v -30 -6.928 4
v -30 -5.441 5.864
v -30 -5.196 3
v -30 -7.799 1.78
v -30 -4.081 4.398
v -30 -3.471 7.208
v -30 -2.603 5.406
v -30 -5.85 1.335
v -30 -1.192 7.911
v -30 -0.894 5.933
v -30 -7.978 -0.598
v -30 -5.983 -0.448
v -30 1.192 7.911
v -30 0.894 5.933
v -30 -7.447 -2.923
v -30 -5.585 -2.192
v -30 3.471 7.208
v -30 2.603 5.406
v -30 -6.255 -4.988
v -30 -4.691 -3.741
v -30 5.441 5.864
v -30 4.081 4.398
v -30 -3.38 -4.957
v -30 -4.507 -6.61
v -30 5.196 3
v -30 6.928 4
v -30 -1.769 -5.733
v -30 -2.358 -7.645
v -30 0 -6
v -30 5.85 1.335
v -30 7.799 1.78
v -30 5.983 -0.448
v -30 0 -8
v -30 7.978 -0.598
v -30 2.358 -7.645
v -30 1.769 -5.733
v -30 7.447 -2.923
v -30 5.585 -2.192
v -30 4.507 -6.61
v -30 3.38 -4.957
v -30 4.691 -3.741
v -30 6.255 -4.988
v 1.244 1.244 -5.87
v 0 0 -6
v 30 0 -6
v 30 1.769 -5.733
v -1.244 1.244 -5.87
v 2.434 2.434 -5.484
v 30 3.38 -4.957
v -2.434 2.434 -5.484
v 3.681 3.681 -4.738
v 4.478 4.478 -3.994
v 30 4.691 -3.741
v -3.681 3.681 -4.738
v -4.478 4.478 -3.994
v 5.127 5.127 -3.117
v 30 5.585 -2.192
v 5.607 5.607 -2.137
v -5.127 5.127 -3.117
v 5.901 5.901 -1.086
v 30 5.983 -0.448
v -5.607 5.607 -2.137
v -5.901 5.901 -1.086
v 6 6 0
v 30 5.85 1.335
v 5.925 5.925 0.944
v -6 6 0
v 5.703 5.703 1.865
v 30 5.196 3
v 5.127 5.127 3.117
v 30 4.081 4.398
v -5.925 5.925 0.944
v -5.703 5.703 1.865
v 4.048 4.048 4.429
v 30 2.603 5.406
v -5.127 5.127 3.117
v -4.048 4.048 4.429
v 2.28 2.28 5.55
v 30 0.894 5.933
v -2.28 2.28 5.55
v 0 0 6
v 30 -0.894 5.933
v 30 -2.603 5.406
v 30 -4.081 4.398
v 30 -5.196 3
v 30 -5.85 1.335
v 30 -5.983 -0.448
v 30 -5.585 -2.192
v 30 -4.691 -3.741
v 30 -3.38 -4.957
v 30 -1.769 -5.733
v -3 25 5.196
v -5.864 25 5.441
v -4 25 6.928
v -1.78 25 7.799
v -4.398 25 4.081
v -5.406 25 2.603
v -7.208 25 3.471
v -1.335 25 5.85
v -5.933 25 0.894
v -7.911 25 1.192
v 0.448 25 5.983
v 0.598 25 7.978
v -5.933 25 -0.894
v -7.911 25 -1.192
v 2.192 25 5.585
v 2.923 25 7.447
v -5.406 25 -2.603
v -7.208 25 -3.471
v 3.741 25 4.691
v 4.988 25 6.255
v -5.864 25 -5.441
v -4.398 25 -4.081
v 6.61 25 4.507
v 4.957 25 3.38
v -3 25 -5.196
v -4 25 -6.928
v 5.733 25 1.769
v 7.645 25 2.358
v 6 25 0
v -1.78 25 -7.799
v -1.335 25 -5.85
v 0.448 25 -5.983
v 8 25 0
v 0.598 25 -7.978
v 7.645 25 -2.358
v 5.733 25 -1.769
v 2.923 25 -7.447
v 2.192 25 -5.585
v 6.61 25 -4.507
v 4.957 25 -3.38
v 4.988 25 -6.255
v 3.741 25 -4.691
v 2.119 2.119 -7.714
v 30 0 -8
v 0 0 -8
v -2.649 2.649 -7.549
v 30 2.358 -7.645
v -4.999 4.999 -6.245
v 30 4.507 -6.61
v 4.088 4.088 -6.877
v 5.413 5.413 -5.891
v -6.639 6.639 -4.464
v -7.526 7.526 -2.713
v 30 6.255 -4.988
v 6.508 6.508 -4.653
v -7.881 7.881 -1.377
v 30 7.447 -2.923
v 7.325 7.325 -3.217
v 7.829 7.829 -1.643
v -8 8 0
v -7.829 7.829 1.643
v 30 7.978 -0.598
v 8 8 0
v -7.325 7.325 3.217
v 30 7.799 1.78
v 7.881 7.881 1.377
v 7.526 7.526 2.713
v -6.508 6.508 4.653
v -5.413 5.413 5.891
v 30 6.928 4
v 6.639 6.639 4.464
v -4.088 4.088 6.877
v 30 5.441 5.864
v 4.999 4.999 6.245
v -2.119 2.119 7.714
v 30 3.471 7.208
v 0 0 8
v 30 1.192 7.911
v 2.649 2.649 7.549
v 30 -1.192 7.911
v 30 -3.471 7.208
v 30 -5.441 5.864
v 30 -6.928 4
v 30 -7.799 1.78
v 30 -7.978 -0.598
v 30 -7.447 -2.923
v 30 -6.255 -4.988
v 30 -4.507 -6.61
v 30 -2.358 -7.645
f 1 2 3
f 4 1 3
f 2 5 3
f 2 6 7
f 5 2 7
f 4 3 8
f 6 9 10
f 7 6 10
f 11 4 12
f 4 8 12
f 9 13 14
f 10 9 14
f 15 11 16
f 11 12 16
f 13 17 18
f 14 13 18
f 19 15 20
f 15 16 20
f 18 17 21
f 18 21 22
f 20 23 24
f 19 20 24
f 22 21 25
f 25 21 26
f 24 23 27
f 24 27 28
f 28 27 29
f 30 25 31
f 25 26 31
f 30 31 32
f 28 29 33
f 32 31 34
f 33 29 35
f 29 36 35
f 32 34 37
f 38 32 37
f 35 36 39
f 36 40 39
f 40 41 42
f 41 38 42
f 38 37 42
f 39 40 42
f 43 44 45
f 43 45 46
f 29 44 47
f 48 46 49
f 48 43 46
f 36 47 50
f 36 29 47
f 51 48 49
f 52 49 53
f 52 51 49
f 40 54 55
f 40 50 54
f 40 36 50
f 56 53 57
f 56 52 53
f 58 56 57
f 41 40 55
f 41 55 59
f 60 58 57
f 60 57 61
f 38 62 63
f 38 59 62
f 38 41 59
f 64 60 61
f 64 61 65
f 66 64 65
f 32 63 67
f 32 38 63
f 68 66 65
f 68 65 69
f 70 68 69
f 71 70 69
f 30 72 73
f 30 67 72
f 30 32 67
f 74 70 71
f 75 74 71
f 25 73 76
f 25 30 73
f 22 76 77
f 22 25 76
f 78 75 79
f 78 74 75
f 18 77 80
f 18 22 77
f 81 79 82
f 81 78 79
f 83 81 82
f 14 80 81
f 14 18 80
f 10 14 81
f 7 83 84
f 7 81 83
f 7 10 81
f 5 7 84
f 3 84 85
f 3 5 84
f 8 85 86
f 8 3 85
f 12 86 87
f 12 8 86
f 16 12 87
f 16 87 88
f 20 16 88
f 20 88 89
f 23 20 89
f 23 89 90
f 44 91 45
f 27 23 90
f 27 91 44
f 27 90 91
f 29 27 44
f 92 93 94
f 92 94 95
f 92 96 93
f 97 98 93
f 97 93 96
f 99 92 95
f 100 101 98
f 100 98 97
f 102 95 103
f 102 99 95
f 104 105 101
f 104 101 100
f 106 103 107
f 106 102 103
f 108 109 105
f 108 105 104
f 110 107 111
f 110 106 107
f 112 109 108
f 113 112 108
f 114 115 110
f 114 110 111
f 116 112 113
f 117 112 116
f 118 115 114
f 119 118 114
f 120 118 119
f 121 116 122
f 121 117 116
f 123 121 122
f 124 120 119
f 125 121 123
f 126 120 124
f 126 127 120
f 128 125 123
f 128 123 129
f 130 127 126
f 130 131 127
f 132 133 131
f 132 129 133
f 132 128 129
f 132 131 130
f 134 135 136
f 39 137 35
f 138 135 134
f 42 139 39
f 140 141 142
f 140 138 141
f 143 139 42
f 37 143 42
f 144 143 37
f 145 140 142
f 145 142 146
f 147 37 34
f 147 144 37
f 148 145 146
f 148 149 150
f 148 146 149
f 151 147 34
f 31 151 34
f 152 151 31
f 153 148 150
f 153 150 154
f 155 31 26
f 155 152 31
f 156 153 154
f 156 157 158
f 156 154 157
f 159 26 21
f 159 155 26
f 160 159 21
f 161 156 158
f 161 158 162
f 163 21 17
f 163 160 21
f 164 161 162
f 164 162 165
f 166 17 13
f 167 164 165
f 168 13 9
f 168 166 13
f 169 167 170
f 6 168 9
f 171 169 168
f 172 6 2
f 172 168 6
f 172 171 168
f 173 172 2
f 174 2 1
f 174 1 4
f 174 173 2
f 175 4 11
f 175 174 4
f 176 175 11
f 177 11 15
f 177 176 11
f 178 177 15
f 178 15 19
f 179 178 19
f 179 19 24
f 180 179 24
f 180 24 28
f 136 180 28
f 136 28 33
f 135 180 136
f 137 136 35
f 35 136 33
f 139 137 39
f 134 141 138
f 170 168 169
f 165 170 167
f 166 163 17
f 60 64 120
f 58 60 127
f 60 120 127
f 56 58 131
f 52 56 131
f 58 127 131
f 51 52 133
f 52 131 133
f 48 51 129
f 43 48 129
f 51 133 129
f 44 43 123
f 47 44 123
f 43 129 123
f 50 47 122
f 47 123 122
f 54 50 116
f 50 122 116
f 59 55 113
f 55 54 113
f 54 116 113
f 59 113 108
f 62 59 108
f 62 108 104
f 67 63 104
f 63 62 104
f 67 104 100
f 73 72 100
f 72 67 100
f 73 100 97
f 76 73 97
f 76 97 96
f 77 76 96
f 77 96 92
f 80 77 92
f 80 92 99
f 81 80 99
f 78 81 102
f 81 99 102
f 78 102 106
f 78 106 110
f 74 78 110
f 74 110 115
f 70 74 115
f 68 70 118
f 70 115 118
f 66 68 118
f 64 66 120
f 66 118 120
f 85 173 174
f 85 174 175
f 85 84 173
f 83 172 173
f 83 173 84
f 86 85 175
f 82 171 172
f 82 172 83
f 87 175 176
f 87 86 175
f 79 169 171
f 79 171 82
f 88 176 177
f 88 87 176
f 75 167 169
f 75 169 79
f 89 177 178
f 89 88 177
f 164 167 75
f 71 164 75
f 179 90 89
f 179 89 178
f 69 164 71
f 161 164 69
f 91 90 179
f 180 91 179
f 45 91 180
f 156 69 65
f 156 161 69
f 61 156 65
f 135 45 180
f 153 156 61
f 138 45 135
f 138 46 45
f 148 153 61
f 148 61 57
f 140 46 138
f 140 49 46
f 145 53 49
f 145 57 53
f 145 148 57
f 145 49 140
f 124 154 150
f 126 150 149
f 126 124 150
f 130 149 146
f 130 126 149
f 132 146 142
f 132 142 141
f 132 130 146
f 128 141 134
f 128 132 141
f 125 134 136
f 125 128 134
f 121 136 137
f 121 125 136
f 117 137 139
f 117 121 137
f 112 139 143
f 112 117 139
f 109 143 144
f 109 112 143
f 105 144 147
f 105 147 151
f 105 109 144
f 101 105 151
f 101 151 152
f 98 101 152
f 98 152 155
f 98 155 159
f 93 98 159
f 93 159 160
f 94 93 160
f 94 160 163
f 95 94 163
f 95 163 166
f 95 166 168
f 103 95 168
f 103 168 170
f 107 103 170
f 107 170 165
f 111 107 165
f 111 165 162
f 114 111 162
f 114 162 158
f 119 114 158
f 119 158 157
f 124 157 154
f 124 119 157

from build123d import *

# Parameters (mm, degrees)
SKETCH1_R           = 8
SKETCH1_R_2         = 6
BOSS_EXTRUDE1_DEPTH = 30
BOSS_EXTRUDE2_REACH = 35
SKETCH3_R           = 8
SKETCH4_R           = 6
CUT_EXTRUDE1_DEPTH  = 25


with BuildPart() as part:
    # Sketch1 → Boss-Extrude1 (new body, symmetric)
    with BuildSketch(Plane(origin=(0, 0, 0), x_dir=(0, 0, -1), z_dir=(1, 0, 0))):
        Circle(SKETCH1_R)
        Circle(SKETCH1_R_2, mode=Mode.SUBTRACT)
    extrude(amount=BOSS_EXTRUDE1_DEPTH, both=True)

    # Sketch3 → Boss-Extrude2 (add, up to next)
    with BuildSketch(Plane(origin=(0, 25, 0), x_dir=(1, 0, 0), z_dir=(0, 1, 0)), mode=Mode.PRIVATE) as boss_extrude2_sk1:
        Circle(SKETCH3_R)
    boss_extrude2_tool1 = extrude(boss_extrude2_sk1.sketch, amount=-BOSS_EXTRUDE2_REACH, mode=Mode.PRIVATE) - part.part
    add(boss_extrude2_tool1.solids().sort_by_distance((0, 25, 0))[0])

    # Sketch4 → Cut-Extrude1 (cut)
    with BuildSketch(Plane(origin=(0, 25, 0), x_dir=(1, 0, 0), z_dir=(0, 1, 0))):
        Circle(SKETCH4_R)
    extrude(amount=-CUT_EXTRUDE1_DEPTH, mode=Mode.SUBTRACT)


solid = part.part
